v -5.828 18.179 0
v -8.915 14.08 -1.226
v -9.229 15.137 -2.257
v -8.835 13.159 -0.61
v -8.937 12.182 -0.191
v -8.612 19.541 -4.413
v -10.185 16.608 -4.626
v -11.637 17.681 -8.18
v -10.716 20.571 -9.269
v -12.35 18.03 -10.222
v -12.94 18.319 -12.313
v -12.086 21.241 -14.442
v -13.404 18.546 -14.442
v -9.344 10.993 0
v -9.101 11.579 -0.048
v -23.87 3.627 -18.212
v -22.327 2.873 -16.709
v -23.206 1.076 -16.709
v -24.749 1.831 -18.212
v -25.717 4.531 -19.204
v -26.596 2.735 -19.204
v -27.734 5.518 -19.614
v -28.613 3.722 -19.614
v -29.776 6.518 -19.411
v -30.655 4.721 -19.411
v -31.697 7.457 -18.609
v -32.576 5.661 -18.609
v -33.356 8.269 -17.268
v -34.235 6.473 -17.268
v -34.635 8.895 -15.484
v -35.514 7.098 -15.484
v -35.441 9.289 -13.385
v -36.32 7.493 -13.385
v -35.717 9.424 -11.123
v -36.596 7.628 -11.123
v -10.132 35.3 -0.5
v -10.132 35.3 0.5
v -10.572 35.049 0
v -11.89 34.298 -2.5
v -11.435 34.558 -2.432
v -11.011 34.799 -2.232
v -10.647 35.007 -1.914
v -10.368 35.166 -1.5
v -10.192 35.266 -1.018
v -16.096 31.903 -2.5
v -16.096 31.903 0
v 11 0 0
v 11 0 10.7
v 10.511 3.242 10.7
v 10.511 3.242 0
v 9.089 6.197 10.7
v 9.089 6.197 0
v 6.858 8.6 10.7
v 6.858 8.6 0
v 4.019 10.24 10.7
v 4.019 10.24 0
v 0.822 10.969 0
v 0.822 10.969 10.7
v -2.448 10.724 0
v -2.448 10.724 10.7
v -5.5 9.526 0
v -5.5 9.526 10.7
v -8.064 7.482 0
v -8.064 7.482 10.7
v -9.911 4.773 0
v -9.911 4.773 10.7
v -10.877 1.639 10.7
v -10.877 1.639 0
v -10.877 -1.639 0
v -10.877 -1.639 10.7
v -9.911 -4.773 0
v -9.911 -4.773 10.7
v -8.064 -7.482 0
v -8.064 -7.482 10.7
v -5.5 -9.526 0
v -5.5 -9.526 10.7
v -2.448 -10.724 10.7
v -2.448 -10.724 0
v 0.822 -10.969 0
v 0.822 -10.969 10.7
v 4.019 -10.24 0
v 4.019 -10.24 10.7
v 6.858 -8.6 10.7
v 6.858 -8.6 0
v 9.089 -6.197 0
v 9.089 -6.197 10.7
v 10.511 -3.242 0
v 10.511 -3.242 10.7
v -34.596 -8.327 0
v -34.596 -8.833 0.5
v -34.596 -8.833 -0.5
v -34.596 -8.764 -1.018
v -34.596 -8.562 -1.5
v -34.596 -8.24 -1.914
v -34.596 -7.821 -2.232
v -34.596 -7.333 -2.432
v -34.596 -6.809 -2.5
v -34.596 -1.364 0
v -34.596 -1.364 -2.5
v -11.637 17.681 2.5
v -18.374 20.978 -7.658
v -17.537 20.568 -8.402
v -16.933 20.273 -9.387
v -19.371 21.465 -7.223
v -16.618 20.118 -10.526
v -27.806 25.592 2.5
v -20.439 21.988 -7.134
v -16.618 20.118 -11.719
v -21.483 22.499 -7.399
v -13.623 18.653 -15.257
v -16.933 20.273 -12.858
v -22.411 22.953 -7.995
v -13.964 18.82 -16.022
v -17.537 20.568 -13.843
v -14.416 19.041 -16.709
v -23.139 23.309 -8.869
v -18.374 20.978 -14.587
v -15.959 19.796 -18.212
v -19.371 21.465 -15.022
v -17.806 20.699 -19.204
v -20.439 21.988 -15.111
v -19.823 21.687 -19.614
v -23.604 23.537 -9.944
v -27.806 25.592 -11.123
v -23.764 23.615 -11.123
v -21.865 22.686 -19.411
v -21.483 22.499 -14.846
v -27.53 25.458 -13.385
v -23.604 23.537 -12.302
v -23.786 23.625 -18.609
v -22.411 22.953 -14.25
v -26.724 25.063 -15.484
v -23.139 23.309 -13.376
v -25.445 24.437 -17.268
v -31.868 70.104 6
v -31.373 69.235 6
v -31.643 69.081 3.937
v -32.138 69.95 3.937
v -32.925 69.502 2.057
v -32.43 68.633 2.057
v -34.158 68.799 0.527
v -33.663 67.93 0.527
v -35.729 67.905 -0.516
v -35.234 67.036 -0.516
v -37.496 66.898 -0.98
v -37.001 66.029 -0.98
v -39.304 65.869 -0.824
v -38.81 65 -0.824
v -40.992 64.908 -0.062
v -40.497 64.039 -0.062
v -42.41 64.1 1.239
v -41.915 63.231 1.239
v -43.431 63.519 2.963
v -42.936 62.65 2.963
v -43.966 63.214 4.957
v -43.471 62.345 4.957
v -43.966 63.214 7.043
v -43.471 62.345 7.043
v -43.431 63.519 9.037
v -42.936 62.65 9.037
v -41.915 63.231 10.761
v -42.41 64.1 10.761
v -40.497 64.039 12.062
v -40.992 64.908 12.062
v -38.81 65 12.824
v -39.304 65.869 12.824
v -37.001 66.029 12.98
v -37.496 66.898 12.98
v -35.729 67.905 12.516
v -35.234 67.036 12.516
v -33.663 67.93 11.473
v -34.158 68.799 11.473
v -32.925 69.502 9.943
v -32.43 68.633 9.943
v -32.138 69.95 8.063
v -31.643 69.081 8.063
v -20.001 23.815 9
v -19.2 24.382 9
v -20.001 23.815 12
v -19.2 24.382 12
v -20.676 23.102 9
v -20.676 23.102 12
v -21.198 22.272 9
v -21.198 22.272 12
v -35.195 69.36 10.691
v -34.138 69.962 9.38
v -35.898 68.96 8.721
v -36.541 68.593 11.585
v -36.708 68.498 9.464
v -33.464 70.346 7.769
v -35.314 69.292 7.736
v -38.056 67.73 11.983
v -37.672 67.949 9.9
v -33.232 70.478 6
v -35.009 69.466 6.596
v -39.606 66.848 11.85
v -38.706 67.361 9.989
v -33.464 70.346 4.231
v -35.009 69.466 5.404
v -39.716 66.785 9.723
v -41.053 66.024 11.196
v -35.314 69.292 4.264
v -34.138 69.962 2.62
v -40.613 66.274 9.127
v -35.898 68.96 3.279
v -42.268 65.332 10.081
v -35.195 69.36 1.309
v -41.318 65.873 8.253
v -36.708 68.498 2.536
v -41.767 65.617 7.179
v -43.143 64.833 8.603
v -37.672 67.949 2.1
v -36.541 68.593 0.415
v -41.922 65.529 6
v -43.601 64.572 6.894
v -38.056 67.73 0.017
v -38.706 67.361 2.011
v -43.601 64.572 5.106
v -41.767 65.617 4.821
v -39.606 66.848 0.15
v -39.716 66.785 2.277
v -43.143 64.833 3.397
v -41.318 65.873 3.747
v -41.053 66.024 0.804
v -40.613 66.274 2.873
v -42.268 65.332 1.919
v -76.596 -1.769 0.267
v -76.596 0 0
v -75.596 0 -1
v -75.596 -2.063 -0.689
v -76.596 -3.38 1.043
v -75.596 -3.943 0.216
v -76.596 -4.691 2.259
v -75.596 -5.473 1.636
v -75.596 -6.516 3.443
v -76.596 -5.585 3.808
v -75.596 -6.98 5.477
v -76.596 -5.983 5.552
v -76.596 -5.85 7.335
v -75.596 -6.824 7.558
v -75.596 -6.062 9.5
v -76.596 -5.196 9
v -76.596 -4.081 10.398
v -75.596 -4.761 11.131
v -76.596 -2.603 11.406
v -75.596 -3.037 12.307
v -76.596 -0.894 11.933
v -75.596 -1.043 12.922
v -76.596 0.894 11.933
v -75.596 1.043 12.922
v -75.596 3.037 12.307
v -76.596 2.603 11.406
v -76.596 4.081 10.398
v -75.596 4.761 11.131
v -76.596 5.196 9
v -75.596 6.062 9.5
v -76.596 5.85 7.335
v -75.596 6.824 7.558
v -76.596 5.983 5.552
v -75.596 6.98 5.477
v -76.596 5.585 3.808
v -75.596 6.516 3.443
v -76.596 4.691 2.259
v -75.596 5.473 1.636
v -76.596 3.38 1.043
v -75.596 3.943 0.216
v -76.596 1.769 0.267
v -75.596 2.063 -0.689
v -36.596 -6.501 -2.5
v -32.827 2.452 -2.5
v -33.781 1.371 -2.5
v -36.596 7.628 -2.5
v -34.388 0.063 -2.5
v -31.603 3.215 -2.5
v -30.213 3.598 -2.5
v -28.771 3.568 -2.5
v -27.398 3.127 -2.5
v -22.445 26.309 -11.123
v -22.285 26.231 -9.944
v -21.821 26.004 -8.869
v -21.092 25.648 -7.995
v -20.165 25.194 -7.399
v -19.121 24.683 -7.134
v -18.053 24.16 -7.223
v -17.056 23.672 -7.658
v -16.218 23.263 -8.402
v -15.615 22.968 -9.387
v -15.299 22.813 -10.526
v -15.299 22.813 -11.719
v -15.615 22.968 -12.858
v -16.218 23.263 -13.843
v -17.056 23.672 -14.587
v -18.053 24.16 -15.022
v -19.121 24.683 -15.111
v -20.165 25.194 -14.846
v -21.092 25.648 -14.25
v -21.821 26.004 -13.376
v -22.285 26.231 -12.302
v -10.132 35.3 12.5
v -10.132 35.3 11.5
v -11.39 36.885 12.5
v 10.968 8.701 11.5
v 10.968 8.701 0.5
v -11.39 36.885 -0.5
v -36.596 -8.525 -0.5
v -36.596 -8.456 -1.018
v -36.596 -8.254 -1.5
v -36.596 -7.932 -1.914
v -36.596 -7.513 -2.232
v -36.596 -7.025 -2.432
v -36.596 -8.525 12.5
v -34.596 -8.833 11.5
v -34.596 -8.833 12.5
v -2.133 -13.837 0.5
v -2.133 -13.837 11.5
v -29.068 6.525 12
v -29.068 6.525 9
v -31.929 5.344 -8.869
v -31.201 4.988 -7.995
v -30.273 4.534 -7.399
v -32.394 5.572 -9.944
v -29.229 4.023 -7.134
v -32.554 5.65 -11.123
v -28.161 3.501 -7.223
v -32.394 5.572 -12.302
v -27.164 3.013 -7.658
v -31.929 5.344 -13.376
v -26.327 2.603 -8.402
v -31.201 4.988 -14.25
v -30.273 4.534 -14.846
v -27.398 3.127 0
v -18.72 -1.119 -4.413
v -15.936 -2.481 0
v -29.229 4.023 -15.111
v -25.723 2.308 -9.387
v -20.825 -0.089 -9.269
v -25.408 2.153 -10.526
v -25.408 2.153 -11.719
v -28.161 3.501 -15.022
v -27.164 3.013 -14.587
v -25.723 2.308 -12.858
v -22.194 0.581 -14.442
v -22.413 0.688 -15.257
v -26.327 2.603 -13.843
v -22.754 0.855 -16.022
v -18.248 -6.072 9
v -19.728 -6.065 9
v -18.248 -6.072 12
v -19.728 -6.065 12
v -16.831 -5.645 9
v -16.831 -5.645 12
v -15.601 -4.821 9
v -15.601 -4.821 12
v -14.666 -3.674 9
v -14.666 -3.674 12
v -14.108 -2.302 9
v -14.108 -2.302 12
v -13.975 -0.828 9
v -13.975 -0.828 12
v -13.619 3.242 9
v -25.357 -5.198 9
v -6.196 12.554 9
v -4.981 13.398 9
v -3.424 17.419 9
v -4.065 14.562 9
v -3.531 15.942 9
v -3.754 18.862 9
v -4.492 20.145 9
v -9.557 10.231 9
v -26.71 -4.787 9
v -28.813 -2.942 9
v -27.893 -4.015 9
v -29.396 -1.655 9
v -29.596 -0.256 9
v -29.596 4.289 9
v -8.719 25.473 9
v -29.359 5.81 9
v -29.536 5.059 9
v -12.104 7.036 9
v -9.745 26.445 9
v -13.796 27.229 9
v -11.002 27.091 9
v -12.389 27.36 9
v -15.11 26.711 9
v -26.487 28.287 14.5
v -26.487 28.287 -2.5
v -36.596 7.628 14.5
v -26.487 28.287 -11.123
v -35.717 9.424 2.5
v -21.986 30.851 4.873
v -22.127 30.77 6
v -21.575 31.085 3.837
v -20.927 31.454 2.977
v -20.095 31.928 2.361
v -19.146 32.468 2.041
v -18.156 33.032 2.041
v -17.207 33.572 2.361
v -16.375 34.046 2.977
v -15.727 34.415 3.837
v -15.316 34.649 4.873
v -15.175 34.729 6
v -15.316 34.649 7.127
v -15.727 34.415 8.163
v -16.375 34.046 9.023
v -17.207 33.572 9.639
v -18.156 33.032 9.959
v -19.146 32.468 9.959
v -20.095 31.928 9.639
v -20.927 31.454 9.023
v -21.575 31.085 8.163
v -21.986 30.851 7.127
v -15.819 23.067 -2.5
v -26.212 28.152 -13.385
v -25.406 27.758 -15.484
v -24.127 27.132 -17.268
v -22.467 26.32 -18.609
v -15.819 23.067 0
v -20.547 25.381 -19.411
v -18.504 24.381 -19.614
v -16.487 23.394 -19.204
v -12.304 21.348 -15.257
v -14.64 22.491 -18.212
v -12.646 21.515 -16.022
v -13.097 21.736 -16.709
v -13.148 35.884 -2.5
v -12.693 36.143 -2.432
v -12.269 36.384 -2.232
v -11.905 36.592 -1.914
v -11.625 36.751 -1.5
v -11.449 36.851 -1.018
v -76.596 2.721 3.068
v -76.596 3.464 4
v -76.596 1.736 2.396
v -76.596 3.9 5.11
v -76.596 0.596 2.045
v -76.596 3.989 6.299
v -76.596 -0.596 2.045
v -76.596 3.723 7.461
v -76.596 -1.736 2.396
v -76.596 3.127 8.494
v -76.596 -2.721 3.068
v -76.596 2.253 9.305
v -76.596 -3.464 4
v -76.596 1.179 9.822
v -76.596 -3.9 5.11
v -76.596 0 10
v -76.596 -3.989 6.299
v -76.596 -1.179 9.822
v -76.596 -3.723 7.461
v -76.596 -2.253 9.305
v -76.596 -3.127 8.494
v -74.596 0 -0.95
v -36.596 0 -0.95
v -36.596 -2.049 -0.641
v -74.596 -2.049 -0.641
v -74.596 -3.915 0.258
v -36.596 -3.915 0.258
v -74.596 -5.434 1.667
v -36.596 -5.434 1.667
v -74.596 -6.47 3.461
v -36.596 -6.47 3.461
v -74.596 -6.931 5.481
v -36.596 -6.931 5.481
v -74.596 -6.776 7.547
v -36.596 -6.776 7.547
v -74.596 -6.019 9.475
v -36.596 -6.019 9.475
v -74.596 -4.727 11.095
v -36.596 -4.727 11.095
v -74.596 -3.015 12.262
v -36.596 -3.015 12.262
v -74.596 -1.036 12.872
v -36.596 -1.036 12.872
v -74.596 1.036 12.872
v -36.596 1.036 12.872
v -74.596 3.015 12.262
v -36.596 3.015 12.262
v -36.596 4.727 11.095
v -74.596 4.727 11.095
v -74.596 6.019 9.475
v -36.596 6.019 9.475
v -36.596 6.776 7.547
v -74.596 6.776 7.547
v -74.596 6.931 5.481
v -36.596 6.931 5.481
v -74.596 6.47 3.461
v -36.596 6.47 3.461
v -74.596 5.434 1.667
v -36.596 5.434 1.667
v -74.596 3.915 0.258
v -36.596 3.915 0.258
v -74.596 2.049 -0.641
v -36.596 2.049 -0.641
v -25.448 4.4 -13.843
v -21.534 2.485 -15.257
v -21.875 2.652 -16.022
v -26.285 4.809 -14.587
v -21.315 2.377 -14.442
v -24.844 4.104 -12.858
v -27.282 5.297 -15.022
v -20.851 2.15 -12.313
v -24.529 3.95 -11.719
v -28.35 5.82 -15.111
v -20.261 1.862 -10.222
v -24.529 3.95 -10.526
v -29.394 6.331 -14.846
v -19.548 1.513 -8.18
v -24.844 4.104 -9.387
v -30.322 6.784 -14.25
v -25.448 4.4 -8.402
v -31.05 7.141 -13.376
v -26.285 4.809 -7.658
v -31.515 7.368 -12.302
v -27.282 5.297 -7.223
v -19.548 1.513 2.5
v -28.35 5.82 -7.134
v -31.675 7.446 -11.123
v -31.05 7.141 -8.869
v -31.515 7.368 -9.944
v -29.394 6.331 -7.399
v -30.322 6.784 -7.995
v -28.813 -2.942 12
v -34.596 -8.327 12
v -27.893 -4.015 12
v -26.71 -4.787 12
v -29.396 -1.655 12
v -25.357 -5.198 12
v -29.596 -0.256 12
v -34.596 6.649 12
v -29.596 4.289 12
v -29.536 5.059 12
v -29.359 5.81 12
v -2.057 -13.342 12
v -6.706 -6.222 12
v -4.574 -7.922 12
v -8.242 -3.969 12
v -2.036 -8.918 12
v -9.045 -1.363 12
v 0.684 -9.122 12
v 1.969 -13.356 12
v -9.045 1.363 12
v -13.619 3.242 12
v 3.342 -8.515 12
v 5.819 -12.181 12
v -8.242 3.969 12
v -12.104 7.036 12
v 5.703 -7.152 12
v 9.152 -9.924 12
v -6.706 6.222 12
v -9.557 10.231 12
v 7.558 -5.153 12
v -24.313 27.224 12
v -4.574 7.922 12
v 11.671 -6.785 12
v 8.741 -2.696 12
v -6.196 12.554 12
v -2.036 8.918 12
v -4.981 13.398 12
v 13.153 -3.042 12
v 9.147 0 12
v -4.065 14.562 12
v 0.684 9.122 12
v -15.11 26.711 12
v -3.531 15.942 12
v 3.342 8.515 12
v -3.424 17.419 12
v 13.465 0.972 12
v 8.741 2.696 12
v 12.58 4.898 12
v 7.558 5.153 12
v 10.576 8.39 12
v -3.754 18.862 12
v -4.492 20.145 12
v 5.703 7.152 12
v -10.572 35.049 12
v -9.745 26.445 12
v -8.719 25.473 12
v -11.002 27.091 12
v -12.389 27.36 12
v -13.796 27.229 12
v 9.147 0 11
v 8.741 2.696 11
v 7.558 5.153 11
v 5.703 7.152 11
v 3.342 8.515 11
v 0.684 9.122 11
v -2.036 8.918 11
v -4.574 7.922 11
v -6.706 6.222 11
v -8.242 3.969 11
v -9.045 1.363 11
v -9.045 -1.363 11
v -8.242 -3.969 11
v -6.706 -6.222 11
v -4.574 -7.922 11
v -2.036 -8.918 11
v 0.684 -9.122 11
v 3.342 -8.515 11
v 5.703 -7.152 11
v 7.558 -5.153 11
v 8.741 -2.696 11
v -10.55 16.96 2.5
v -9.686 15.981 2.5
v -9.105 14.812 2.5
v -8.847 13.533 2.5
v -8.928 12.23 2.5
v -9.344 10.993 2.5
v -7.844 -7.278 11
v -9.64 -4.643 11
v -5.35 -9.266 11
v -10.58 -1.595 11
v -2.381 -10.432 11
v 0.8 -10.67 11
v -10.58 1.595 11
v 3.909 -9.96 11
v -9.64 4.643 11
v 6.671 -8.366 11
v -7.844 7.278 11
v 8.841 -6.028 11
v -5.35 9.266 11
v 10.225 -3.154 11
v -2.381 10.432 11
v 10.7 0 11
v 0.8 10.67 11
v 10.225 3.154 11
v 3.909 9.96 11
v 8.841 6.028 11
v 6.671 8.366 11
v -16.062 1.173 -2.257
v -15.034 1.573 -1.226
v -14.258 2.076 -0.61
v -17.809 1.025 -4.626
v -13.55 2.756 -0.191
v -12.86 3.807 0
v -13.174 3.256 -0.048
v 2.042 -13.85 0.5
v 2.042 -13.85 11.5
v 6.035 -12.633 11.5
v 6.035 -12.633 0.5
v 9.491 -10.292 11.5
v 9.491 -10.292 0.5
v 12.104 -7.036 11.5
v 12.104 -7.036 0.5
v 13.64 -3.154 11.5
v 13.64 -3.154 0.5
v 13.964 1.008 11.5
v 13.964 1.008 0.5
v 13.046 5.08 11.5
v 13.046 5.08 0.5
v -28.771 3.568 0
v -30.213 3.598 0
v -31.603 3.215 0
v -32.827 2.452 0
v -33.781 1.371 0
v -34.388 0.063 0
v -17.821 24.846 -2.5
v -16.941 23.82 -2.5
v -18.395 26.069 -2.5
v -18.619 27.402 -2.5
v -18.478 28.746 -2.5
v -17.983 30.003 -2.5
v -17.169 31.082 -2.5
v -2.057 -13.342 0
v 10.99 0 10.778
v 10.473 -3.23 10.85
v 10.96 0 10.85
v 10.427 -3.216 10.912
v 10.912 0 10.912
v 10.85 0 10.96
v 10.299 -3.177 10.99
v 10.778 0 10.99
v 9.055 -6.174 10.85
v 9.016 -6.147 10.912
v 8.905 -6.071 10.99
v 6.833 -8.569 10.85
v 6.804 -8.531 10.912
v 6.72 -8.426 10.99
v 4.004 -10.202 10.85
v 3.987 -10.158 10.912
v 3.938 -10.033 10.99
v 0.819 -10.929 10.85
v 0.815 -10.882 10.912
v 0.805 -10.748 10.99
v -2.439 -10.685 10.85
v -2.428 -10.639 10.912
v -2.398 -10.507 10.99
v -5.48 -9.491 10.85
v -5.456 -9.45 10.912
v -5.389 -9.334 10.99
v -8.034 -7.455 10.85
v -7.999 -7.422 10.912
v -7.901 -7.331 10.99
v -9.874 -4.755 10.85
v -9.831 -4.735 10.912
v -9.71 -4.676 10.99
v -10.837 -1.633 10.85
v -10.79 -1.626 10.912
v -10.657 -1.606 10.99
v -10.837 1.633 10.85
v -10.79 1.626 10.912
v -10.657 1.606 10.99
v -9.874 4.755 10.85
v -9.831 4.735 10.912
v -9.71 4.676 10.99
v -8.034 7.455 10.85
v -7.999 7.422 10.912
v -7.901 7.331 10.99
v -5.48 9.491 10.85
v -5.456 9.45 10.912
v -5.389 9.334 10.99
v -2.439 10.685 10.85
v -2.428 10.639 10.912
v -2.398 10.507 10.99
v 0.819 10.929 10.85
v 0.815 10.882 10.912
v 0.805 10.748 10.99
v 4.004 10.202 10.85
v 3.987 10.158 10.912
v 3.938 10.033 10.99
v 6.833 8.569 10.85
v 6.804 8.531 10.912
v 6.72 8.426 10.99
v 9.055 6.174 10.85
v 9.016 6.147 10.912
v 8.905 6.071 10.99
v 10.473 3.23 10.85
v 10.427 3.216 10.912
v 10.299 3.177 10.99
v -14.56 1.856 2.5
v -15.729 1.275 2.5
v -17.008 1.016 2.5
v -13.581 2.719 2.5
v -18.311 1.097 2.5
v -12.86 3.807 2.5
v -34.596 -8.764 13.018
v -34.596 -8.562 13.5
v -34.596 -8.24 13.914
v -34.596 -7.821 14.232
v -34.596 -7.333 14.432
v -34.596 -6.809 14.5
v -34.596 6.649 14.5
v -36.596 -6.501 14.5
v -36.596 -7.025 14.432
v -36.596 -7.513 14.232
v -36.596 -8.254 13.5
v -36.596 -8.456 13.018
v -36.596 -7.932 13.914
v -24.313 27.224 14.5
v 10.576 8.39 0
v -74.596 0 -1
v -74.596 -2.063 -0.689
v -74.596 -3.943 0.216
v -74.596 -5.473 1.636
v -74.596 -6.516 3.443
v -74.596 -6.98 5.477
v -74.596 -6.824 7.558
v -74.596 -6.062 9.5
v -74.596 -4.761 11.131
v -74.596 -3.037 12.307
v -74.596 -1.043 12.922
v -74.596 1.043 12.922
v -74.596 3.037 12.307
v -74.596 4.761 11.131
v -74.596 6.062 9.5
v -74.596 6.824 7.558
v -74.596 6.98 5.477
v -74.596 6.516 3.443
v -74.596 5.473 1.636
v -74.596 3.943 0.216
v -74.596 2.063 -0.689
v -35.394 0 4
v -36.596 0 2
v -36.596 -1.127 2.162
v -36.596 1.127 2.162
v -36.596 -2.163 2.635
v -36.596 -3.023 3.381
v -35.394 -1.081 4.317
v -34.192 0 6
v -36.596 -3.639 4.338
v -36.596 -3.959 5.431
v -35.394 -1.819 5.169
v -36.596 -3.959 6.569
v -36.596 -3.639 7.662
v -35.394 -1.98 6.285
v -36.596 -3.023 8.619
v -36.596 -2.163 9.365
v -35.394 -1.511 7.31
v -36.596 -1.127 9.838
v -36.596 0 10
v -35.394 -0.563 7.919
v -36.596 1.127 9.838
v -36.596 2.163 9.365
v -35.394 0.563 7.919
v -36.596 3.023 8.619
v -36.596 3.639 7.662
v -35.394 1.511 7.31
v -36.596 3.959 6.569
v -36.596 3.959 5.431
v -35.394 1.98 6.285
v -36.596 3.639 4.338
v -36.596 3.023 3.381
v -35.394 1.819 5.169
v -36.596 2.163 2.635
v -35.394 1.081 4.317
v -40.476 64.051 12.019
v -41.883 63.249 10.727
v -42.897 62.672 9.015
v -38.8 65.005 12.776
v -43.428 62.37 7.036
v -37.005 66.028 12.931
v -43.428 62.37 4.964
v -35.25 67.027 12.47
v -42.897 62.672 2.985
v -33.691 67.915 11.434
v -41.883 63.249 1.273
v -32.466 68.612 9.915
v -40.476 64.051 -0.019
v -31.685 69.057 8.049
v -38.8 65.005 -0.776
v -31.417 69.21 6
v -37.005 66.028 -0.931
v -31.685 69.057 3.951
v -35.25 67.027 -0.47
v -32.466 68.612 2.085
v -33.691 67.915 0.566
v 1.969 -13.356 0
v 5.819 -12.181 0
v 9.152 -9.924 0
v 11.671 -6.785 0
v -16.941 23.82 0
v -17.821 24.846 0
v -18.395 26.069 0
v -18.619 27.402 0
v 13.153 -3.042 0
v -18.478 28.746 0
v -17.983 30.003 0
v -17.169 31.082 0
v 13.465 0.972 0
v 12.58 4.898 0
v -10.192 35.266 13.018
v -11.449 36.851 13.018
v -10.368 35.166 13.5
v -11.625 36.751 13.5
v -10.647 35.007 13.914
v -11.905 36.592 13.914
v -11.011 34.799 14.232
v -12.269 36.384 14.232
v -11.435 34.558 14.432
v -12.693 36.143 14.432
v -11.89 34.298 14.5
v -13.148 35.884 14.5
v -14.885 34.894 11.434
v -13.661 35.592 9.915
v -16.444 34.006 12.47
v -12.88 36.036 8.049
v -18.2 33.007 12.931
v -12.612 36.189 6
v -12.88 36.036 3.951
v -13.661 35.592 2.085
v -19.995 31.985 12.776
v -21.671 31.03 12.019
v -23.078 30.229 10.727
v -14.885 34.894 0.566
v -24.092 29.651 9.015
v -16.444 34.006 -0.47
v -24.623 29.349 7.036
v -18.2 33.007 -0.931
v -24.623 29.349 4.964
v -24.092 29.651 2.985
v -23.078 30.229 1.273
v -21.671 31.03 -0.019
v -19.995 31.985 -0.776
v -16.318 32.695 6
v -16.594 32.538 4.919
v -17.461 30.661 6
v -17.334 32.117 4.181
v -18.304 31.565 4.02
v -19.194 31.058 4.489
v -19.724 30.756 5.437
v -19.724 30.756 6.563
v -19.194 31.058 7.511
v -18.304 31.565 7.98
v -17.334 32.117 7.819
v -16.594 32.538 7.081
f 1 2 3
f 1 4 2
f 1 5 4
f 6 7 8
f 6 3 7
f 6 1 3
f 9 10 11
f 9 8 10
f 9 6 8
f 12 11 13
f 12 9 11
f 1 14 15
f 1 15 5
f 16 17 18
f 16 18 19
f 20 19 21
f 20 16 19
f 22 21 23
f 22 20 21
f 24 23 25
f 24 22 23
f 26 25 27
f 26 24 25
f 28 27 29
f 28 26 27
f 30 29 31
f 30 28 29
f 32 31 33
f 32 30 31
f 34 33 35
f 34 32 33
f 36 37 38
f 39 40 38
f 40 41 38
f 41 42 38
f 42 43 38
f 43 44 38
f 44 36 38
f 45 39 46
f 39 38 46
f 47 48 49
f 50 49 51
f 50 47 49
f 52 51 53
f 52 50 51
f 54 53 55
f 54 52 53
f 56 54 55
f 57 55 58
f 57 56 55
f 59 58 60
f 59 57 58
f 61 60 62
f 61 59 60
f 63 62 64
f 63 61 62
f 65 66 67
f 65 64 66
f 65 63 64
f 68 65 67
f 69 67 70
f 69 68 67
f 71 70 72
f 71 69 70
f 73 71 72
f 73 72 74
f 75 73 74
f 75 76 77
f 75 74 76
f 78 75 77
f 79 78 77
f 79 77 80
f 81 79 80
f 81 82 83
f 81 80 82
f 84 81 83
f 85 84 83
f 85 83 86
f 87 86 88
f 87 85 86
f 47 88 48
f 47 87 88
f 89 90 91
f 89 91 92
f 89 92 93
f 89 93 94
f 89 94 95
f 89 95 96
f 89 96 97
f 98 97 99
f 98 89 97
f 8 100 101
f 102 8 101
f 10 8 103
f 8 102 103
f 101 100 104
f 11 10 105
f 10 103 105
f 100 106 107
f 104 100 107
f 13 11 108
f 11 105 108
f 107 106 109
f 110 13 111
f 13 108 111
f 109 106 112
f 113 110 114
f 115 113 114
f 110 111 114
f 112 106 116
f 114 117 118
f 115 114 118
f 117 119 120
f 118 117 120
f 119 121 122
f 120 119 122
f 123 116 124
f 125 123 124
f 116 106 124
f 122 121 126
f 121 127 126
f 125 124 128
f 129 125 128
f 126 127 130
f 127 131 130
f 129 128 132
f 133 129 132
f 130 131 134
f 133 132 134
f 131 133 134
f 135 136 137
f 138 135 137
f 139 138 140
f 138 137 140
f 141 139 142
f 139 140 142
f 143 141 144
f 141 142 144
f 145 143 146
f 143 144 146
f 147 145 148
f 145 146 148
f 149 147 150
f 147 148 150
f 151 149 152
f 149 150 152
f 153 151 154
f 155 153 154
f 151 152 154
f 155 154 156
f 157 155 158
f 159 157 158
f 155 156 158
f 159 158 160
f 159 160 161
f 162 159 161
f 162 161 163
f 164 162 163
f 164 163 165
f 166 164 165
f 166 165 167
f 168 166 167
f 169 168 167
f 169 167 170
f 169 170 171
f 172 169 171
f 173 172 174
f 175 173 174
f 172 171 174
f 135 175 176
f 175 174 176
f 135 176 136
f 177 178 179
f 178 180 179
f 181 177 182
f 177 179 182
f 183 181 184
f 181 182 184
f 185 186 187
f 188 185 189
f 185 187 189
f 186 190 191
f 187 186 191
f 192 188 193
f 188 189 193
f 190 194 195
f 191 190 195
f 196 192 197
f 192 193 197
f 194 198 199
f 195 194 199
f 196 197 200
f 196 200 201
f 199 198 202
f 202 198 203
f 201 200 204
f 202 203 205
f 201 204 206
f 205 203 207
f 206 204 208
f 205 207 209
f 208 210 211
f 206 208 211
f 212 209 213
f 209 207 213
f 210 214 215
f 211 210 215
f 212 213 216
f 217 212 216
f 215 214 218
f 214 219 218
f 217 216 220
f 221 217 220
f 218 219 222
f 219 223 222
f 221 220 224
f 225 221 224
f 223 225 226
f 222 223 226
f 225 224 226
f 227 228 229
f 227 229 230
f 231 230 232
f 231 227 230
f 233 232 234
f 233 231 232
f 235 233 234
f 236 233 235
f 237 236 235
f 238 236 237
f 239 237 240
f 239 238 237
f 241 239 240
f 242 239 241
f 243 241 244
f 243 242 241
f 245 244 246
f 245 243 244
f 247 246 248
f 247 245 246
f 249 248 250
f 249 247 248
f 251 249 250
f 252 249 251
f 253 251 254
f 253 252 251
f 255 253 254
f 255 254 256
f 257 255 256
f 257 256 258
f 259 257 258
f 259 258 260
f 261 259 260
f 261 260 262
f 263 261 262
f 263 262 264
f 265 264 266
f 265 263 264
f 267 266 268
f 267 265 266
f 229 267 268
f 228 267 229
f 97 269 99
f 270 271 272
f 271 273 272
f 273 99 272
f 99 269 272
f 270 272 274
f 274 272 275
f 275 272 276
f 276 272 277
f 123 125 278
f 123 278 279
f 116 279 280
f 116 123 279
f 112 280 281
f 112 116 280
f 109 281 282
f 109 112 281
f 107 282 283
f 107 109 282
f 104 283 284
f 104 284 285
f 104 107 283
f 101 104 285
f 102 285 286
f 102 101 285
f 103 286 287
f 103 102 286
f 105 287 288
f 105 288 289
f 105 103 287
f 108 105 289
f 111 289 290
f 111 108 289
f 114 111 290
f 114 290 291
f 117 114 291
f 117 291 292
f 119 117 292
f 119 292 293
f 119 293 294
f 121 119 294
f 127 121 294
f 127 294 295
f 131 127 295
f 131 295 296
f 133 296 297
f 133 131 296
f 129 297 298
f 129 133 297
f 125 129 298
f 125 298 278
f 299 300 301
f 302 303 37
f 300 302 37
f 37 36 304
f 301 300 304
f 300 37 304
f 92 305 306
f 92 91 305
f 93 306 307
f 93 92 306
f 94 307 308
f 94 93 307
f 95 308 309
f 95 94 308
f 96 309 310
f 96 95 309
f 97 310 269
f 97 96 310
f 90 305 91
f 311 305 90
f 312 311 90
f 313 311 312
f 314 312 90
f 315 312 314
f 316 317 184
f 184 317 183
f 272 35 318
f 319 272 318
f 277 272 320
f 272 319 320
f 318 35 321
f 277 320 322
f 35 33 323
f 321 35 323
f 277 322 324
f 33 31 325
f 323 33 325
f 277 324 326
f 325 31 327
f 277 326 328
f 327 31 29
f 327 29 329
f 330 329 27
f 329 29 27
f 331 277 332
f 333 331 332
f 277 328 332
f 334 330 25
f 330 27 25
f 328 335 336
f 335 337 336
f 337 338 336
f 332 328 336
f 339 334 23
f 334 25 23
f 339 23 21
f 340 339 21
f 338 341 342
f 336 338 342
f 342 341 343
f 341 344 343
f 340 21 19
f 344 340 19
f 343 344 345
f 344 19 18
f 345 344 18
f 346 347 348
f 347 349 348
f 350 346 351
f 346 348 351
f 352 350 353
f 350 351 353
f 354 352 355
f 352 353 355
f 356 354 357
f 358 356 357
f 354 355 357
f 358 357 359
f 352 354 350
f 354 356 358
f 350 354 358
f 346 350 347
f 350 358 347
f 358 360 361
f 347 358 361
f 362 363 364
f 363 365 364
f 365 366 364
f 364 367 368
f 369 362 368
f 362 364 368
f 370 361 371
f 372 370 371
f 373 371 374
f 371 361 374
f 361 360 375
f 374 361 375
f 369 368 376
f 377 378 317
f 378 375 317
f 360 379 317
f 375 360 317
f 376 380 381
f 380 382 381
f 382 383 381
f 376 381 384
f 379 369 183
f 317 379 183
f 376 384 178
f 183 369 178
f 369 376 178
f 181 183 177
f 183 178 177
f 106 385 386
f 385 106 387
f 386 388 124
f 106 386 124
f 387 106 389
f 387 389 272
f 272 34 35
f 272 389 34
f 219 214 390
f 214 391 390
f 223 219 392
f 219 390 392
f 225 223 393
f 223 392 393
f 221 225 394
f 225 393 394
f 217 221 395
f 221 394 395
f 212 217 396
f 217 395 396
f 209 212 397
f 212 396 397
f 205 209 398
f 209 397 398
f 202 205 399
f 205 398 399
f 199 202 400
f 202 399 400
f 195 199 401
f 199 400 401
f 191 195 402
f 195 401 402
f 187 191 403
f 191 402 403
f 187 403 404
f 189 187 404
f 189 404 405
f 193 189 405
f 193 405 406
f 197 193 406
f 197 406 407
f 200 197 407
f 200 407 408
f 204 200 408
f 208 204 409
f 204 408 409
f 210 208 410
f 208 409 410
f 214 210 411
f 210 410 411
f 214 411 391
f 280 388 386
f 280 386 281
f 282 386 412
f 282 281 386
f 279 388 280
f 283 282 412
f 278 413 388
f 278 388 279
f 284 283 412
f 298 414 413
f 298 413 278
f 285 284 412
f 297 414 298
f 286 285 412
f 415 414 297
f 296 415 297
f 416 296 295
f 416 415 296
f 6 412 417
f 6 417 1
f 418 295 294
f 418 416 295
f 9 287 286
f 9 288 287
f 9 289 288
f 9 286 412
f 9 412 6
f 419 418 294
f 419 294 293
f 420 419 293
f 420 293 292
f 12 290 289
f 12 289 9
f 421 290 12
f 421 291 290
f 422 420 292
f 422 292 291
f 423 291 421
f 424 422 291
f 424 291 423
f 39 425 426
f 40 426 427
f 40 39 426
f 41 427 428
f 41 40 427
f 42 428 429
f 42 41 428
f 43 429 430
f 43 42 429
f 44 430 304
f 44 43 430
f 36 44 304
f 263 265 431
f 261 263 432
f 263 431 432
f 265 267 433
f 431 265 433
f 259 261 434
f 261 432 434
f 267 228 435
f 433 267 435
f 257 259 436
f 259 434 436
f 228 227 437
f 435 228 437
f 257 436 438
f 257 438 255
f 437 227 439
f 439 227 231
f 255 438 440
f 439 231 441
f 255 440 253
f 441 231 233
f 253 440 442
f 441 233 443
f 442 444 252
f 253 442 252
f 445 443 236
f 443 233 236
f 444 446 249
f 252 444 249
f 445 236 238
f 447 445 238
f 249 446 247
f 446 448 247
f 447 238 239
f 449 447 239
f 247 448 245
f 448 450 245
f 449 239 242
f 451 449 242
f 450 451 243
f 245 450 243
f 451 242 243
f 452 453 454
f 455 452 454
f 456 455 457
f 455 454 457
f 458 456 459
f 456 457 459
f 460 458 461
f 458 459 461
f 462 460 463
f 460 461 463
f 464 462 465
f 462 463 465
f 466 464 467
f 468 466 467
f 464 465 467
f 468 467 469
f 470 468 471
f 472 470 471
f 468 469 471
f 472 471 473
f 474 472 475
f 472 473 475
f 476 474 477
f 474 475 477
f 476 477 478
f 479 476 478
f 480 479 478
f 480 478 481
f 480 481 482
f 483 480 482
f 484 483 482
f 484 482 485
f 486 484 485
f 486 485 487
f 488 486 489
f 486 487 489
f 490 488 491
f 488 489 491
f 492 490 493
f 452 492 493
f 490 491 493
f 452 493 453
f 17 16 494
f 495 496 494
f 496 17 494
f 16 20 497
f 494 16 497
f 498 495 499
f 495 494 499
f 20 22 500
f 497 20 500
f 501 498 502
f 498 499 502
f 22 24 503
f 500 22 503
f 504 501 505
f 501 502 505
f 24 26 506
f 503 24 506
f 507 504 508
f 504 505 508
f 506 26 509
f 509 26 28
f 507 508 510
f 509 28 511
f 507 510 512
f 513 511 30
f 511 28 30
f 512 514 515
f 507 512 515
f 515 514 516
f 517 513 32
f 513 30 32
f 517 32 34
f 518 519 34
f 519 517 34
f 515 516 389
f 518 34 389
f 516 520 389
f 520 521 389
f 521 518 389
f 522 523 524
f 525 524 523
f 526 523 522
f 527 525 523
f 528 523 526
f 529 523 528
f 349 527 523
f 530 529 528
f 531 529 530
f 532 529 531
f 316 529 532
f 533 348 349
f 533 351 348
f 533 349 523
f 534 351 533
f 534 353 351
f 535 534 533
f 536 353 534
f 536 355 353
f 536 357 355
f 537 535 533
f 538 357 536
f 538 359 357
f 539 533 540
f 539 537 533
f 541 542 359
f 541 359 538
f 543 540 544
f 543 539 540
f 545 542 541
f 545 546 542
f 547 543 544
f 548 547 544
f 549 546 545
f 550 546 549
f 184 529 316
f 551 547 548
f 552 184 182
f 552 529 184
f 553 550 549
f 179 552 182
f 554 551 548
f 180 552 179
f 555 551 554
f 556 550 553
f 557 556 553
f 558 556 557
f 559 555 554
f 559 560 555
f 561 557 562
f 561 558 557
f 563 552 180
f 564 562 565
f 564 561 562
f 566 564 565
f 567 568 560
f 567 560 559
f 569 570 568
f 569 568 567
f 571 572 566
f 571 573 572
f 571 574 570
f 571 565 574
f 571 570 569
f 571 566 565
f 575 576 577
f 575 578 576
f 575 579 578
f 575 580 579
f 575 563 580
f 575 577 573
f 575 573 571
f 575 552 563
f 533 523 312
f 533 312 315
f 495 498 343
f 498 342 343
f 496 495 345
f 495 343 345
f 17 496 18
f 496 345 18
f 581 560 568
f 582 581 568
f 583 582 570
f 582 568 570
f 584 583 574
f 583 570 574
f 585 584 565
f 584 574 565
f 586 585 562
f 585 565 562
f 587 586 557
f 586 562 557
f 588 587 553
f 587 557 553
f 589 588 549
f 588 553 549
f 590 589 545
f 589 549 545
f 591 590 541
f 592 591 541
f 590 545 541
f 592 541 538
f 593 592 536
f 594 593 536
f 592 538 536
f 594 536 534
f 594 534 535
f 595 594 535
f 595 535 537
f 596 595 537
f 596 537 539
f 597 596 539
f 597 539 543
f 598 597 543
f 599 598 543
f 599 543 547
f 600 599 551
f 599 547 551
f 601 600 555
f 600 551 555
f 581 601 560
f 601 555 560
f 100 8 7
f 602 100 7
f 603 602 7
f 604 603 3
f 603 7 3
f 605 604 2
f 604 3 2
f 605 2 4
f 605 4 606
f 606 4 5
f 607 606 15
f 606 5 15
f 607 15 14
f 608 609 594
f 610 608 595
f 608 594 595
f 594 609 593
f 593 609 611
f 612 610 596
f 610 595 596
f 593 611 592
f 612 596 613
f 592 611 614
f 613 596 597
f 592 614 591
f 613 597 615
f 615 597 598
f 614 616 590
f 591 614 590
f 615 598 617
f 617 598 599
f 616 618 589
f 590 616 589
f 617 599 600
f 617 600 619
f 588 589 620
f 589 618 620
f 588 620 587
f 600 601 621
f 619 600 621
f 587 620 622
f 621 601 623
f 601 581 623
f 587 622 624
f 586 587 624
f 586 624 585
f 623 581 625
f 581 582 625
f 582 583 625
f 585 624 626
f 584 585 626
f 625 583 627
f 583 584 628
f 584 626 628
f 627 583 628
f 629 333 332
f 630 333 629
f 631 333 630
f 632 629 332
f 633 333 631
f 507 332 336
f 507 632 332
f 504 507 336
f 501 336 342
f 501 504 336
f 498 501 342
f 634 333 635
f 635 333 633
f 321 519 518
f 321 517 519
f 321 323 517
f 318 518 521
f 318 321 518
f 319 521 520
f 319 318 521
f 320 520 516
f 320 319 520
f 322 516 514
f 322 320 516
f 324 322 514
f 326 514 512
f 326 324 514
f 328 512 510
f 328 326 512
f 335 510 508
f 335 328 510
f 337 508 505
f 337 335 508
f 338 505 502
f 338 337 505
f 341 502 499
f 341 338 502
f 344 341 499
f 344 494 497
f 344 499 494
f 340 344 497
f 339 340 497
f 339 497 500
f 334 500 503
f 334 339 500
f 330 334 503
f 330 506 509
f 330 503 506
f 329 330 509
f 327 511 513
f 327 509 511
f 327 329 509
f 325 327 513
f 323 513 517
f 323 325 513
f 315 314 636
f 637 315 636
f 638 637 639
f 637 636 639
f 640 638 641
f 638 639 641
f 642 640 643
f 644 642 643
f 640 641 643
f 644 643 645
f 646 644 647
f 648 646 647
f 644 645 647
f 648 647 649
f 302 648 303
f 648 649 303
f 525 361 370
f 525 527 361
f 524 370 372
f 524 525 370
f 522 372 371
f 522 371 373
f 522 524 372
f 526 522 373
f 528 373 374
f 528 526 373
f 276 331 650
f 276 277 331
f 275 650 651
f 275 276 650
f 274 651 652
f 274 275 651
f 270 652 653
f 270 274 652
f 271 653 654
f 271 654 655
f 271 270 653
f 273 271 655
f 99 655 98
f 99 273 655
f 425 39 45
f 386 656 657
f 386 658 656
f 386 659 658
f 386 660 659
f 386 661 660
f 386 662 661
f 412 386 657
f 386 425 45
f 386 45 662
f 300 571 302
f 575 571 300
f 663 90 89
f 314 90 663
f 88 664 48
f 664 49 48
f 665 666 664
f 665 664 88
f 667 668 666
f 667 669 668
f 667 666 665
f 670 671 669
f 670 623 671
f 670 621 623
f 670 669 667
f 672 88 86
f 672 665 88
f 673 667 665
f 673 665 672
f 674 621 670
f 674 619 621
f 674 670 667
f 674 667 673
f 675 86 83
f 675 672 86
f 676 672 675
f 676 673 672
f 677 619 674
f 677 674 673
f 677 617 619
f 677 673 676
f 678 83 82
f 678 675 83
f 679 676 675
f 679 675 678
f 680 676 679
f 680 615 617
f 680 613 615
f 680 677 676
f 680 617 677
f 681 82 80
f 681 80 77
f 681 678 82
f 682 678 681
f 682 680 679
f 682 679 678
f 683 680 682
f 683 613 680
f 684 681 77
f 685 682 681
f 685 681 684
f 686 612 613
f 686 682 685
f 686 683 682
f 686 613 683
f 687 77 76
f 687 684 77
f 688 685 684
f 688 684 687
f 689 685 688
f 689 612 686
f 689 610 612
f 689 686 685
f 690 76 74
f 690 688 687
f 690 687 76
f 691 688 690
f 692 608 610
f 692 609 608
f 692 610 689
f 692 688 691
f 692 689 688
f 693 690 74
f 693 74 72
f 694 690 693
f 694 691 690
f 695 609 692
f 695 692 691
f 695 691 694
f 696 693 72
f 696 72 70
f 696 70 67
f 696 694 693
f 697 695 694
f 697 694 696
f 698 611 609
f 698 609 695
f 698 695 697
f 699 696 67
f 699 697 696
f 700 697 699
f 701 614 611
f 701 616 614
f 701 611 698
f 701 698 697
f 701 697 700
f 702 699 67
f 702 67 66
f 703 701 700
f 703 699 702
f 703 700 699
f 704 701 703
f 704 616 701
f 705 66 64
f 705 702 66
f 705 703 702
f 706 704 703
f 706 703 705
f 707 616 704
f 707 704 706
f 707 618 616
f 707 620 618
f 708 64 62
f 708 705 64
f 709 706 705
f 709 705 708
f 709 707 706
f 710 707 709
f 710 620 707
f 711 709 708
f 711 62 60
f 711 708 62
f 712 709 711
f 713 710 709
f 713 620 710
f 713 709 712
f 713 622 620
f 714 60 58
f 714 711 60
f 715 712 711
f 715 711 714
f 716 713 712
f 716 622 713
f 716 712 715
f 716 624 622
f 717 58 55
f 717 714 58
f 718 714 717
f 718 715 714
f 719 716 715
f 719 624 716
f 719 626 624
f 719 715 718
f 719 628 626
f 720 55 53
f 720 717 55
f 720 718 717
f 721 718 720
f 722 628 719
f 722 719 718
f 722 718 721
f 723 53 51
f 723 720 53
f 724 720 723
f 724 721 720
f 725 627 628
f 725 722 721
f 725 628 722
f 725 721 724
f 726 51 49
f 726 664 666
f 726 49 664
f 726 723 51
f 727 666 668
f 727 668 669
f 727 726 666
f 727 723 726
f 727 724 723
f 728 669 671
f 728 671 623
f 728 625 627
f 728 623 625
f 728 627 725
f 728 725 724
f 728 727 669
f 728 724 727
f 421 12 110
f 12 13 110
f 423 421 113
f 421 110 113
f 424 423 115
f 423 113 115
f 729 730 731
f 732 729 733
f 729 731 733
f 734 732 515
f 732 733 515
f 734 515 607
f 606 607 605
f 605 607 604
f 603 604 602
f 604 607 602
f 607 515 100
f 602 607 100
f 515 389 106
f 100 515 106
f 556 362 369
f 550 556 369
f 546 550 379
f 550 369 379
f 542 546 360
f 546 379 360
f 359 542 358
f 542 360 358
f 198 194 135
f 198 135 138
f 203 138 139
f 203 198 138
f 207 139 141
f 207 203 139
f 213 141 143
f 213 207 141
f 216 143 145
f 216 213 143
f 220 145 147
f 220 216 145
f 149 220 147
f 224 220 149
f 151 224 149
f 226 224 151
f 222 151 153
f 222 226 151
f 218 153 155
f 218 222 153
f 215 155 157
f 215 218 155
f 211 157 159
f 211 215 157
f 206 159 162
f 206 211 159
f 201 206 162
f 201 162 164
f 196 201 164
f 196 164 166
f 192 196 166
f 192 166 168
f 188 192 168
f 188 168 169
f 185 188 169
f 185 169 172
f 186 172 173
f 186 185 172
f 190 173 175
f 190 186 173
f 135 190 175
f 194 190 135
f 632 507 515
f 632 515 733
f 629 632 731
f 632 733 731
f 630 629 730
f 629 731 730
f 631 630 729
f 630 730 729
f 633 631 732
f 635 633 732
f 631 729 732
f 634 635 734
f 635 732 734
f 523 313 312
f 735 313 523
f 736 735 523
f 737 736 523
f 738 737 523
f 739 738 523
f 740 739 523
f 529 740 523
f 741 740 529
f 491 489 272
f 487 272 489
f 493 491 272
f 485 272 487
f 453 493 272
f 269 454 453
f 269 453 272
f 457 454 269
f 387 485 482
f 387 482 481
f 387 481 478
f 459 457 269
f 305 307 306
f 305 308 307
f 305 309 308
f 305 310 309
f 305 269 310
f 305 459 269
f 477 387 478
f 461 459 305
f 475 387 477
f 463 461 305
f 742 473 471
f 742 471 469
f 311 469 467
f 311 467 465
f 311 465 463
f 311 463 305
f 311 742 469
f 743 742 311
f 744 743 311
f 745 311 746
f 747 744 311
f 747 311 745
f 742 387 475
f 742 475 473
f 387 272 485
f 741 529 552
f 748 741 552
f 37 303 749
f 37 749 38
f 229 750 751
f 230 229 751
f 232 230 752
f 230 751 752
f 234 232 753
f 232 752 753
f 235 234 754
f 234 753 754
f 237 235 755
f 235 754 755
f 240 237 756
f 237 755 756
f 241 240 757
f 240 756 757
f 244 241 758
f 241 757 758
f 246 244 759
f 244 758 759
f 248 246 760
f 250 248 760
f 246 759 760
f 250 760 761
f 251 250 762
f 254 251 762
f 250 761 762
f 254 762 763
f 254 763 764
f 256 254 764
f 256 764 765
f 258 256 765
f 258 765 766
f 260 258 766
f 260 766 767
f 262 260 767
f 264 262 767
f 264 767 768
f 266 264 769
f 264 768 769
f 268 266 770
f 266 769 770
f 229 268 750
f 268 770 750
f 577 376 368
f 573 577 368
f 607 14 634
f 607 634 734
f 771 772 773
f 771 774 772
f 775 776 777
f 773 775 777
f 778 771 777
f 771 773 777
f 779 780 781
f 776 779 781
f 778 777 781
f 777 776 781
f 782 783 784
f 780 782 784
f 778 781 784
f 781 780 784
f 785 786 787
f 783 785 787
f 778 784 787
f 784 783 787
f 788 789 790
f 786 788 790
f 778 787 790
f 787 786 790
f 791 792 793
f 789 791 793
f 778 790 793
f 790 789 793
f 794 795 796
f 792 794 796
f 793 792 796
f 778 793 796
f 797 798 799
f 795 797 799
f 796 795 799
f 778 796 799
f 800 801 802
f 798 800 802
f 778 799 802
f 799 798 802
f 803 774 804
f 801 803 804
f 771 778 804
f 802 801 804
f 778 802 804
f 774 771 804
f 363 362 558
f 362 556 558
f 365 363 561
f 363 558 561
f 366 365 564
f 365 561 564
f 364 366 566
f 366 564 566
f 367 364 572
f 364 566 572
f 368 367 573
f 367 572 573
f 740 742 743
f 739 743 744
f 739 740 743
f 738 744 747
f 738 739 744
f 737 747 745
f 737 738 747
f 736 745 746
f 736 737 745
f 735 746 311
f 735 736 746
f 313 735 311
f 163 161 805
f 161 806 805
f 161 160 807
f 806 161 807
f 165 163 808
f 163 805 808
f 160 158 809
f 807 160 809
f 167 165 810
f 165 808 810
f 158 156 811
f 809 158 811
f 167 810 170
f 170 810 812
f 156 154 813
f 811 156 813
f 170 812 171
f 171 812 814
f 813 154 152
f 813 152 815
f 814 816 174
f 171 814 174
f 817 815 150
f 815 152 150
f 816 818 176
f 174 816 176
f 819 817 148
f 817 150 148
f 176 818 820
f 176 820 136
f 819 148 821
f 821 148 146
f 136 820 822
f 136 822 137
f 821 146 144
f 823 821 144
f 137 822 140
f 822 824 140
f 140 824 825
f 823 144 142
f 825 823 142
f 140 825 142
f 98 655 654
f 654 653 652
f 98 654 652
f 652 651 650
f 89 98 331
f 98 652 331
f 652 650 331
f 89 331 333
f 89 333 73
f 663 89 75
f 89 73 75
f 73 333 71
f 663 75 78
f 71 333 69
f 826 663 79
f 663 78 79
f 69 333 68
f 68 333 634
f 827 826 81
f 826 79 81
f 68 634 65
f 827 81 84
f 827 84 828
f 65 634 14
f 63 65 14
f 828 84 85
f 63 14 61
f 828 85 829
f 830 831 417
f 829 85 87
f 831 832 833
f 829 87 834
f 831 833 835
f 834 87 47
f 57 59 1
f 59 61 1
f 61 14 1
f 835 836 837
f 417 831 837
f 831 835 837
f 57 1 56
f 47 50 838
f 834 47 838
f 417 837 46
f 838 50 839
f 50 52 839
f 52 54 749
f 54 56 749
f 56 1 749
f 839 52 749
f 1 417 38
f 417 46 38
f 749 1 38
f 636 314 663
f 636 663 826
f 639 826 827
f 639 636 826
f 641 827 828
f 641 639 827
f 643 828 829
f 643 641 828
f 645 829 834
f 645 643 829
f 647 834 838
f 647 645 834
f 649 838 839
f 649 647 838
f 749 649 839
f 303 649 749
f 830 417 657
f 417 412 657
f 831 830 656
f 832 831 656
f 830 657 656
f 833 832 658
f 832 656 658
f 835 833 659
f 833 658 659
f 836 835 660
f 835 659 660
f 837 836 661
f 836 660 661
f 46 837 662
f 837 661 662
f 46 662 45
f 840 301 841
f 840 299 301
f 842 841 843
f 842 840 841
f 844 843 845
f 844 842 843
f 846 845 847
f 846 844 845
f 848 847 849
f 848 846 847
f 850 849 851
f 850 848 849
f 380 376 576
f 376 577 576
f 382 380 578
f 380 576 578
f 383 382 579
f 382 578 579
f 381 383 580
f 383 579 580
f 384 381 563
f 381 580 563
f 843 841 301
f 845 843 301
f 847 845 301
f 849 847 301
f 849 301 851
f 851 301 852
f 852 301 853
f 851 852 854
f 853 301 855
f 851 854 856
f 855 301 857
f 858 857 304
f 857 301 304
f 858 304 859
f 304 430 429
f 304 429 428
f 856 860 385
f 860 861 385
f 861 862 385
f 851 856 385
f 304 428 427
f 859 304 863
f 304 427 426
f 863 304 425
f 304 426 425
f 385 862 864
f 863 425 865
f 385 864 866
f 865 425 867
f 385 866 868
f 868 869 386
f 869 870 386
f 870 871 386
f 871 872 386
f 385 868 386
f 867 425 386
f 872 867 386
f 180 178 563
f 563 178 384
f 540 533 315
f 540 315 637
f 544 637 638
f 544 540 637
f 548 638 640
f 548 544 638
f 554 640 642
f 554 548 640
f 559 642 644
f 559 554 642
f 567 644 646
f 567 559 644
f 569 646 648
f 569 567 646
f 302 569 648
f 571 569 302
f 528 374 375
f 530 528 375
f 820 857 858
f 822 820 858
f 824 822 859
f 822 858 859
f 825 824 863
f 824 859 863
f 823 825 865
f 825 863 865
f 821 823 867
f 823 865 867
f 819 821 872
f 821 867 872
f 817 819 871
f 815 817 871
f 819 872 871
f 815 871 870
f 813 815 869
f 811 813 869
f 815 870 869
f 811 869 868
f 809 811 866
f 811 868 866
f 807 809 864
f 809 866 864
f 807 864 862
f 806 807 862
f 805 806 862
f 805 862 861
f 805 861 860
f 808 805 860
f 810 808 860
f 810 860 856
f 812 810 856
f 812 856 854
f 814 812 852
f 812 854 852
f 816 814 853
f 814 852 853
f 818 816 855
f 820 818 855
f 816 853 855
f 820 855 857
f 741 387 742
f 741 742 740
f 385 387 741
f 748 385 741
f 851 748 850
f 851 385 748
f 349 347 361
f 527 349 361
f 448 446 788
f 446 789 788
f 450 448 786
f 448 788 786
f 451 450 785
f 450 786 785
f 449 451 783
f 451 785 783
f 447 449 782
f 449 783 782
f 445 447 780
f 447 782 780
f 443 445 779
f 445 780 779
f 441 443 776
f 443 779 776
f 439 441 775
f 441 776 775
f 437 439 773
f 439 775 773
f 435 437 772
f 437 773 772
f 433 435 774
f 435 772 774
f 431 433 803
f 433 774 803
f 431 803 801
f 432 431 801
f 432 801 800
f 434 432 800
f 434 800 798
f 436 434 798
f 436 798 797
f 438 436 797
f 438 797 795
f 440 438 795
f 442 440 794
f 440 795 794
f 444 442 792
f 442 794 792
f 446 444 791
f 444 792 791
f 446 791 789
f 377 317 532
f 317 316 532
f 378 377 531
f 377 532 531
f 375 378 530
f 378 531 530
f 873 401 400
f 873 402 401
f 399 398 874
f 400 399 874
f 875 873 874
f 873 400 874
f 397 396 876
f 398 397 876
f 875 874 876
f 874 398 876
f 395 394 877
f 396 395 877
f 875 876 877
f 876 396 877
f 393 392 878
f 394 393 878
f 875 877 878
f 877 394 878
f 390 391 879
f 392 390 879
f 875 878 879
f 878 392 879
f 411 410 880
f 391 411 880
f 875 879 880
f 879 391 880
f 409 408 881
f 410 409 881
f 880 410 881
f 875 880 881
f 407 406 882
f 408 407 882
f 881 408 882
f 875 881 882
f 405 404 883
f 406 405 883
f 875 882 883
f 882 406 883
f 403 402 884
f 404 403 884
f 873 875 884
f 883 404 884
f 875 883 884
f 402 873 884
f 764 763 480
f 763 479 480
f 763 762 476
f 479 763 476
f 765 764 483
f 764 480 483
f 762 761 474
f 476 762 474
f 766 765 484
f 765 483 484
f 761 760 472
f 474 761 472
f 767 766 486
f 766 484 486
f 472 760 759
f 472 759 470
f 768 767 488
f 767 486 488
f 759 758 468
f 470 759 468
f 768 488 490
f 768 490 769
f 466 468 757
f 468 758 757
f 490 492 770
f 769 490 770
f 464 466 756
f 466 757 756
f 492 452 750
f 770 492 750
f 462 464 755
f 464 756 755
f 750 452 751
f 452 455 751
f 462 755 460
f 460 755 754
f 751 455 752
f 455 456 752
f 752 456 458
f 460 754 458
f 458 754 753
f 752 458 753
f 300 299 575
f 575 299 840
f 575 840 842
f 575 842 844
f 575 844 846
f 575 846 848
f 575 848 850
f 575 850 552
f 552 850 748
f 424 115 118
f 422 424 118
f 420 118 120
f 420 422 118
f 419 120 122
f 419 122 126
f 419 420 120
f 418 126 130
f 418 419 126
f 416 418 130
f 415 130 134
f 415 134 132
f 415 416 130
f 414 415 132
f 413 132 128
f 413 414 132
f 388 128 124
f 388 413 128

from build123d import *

# Parameters (mm, degrees)
SZKIC1_R                         = 11
DODANIE_WYCI_GNI_CIE1_DEPTH      = 12
SZKIC4_R                         = 11.147474951019817
SZKIC4_R_2                       = 9.147474951019817
DODANIE_WYCI_GNI_CIE2_DEPTH      = 1
SZKIC13_R                        = 4.000000000000003
DODANIE_WYCI_GNI_CIE3_DEPTH      = 11.5
WYTNIJ_WYCI_GNI_CIE1_DEPTH       = 60.02626138756585
WYTNIJ_WYCI_GNI_CIE2_DEPTH       = 58.227067591020045
WYTNIJ_WYCI_GNI_CIE3_DEPTH       = 23
DODANIE_WYCI_GNI_CIE4_DEPTH      = 2.5
DODANIE_WYCI_GNI_CIE4_DEPTH_BACK = 14.5
DODANIE_WYCI_GNI_CIE5_DEPTH      = 2.5
OTWORY_USTALAJ_CE_8_0MM1_D       = 8
OTWORY_USTALAJ_CE_8_0MM1_DEPTH   = 40
OTWORY_USTALAJ_CE_8_0MM1_TIP     = 2.403442476110241
OTWORY_USTALAJ_CE_8_0MM2_D       = 8
OTWORY_USTALAJ_CE_8_0MM2_DEPTH   = 40
OTWORY_USTALAJ_CE_8_0MM2_TIP     = 2.403442476110241
SFAZOWANIE1_SIZE                 = 1
ZAOKR_GLENIE2_R                  = 2
ZAOKR_GLENIE3_R                  = 5
SFAZOWANIE2_SIZE                 = 0.5
ZAOKR_GLENIE4_R                  = 0.3
ZAOKR_GLENIE5_R                  = 5
WYTNIJ_WYCI_GNI_CIE4_START       = -3
WYTNIJ_WYCI_GNI_CIE4_DEPTH       = 3
ZAOKR_GLENIE11_R                 = 5


with BuildPart() as part:
    # Szkic1 → Dodanie-wyciągnięcie1 (new body)
    with BuildSketch(Plane.XY):
        with BuildLine():
            Line((-40, -8.000000000000005), (-2.1326786841408407, -13.836606579295779))
            ThreePointArc((-2.1326786841408407, -13.836606579295779), (12.103611293588447, -7.035807960264275), (10.968141143659846, 8.700567789101818))
            Line((10.968141143659846, 8.700567789101818), (-12.843130370941623, 38.71761875780841))
            Line((-12.843130370941623, 38.71761875780841), (-26.746589095410883, 30.799674864537906))
            Line((-26.746589095410883, 30.799674864537906), (-40, 7.999999999999995))
            Line((-40, 7.999999999999995), (-40, -8.000000000000005))
        make_face()
        Circle(SZKIC1_R, mode=Mode.SUBTRACT)
    extrude(amount=DODANIE_WYCI_GNI_CIE1_DEPTH)

    # Szkic4 → Dodanie-wyciągnięcie2 (add)
    with BuildSketch(Plane.XY.offset(12)):
        Circle(SZKIC4_R)
        Circle(SZKIC4_R_2, mode=Mode.SUBTRACT)
    extrude(amount=-DODANIE_WYCI_GNI_CIE2_DEPTH)

    # Szkic13 → Dodanie-wyciągnięcie3 (add, symmetric)
    with BuildSketch(Plane(origin=(0.996619630552348, 2.0368751739166404, 3.1e-16), x_dir=(0.8982426752029381, -0.43949982530630105, 0), z_dir=(0.4394998253063011, 0.8982426752029382, 0))):
        with BuildLine():
            Line((-36.22413445269548, 11.122577076374291), (-36.22413445269548, 8.67e-15))
            Line((-36.22413445269548, 8.67e-15), (-33.72413445269548, 7.61e-15))
            Line((-33.72413445269548, 7.61e-15), (-13.224134452695484, 6.94e-15))
            ThreePointArc((-13.224134452695484, 6.94e-15), (-17.80107386619313, 7.230855656561982), (-20.374424199879662, 15.392443491106029))
            ThreePointArc((-20.374424199879662, 15.392443491106029), (-29.935182038237862, 19.329968170654332), (-36.22413445269548, 11.122577076374291))
        make_face()
        with Locations(Location((-27.724134452695484, 11.122577076374293, 0), (0, 0, 180))):
            Circle(SZKIC13_R, mode=Mode.SUBTRACT)
    extrude(amount=DODANIE_WYCI_GNI_CIE3_DEPTH, both=True)

    # Szkic15 → Wytnij-wyciągnięcie1 (cut, through all)
    with BuildSketch(Plane(origin=(0, 0, 0), x_dir=(-1, 0, 0), z_dir=(0, 0, -1))):
        Polygon((12.843130370941623, 38.71761875780841), (26.746589095410883, 30.799674864537906), (40, 7.999999999999995), (40, -8.000000000000005), (38.494484112785884, -8.232049789295985), (38.494484112785884, 7.999999999999995), (26.00155220007409, 29.491432489730776), (12.09809347560483, 37.40937638300129), (11.896450058886177, 37.52421120875695), align=None)
    extrude(amount=-WYTNIJ_WYCI_GNI_CIE1_DEPTH, mode=Mode.SUBTRACT)

    # Szkic16 → Wytnij-wyciągnięcie2 (cut, through all)
    with BuildSketch(Plane(origin=(0, 0, 0), x_dir=(-1, 0, 0), z_dir=(0, 0, -1))):
        Polygon((26.48719581612529, 28.287166702582056), (36.59569179817021, 7.627585172914479), (36.59569179817021, -8.524716482663612), (38.494484112785884, -8.232049789295985), (38.494484112785884, 7.999999999999995), (26.00155220007409, 29.491432489730776), (11.896450058886177, 37.52421120875695), (11.389545957202317, 36.88519593201458), align=None)
    extrude(amount=-WYTNIJ_WYCI_GNI_CIE2_DEPTH, mode=Mode.SUBTRACT)

    # Szkic17 → Wytnij-wyciągnięcie3 (cut)
    with BuildSketch(Plane(origin=(-32.53806343770011, 15.920500763831628, 0), x_dir=(0, 0, 1), z_dir=(-0.898242675202938, 0.4394998253063012, 0))):
        Polygon((-27.81416800588854, 10.767622358797922), (-27.814168005888536, -7.232377641202076), (1.18e-15, -7.232377641202076), (2.5, -7.232377641202076), (2.5000000000000004, 10.767622358797922), (4.3e-16, 10.767622358797922), align=None)
    extrude(amount=-WYTNIJ_WYCI_GNI_CIE3_DEPTH, mode=Mode.SUBTRACT)

    # Szkic18 → Obrót1 (revolve)
    with BuildSketch(Plane(origin=(0, 0, 6), x_dir=(-1, 0, 0), z_dir=(0, 0, -1)), mode=Mode.PRIVATE) as obr_t1_sk:
        Polygon((76.59569179817022, 0), (76.59569179817021, -7), (74.59569179817021, -7), (74.59569179817021, -6.95), (36.59569179817021, -6.949999999999999), (36.59569179817021, 0), align=None)
    revolve(obr_t1_sk.sketch.rotate(Axis((0, 0, 6), (-1, 0, 0)), 270), axis=Axis((0, 0, 6), (-1, 0, 0)))

    # Szkic19 → Obrót2 (revolve)
    with BuildSketch(Plane(origin=(0, 0, 6), x_dir=(-1, 0, 0), z_dir=(0, 0, -1))):
        Polygon((38.44574931620652, 67.5085471625366), (32.36298612425123, 70.97264761584243), (31.373243137592404, 69.23471527528378), (31.416691446106377, 69.20997170061732), (12.611574699588953, 36.18925723000281), (18.65088517799791, 32.74989261638888), align=None)
    revolve(axis=Axis((0, 0, 6), (-0.4948714933294059, 0.868966170279329, 0)))

    # Szkic20 → Dodanie-wyciągnięcie4 (add, two sides: drawn at the far end of the back side and taken through both)
    with BuildSketch(Plane(origin=(0, 0, 0), x_dir=(-1, 0, 0), z_dir=(0, 0, -1)).offset(-DODANIE_WYCI_GNI_CIE4_DEPTH_BACK)):
        Polygon((36.59569179817021, -8.524716482663612), (34.59569179817021, -8.832982627533559), (34.59569179817021, 6.649008141474715), (36.59569179817021, 7.627585172914479), align=None)
        Polygon((26.48719581612529, 28.287166702582056), (11.389545957202317, 36.88519593201458), (10.13193011920909, 35.29981571891061), (24.31339302460761, 27.223549961252633), align=None)
    extrude(amount=DODANIE_WYCI_GNI_CIE4_DEPTH + DODANIE_WYCI_GNI_CIE4_DEPTH_BACK)

    # Szkic21 → Dodanie-wyciągnięcie5 (add)
    with BuildSketch(Plane.XY.offset(12)):
        Polygon((-24.313393024607603, 27.22354996125263), (-26.48719581612529, 28.287166702582056), (-36.59569179817021, 7.627585172914479), (-34.59569179817021, 6.649008141474715), align=None)
    extrude(amount=DODANIE_WYCI_GNI_CIE5_DEPTH)

    # Otwory ustalające Ø8.0mm1
    with Locations(Plane(origin=(-76.595691798, 0, 6), x_dir=(0, 0, -1), z_dir=(-1, 0, 0))):
        with Locations((0, 0)):
            Hole(OTWORY_USTALAJ_CE_8_0MM1_D / 2, depth=OTWORY_USTALAJ_CE_8_0MM1_DEPTH)
            with Locations((0, 0, -(OTWORY_USTALAJ_CE_8_0MM1_DEPTH + OTWORY_USTALAJ_CE_8_0MM1_TIP / 2))):  # 118° drill point
                Cone(0, OTWORY_USTALAJ_CE_8_0MM1_D / 2, OTWORY_USTALAJ_CE_8_0MM1_TIP, mode=Mode.SUBTRACT)

    # Otwory ustalające Ø8.0mm2
    with Locations(Plane(origin=(-38.445749316, 67.508547163, 6), x_dir=(0.868966170279, 0.494871493329, 0), z_dir=(-0.494871493329, 0.868966170279, 0))):
        with Locations((0, 0)):
            Hole(OTWORY_USTALAJ_CE_8_0MM2_D / 2, depth=OTWORY_USTALAJ_CE_8_0MM2_DEPTH)
            with Locations((0, 0, -(OTWORY_USTALAJ_CE_8_0MM2_DEPTH + OTWORY_USTALAJ_CE_8_0MM2_TIP / 2))):  # 118° drill point
                Cone(0, OTWORY_USTALAJ_CE_8_0MM2_D / 2, OTWORY_USTALAJ_CE_8_0MM2_TIP, mode=Mode.SUBTRACT)

    # Sfazowanie1
    sfazowanie1_edges = [part.edges().sort_by_distance(p)[0] for p in [
        (-76.59569179817021, -2.41e-15, 13),
        (-44.52851250816182, 64.04444670923077, 5.999999999999999),
    ]]
    chamfer(sfazowanie1_edges, length=SFAZOWANIE1_SIZE)

    # Zaokrąglenie2
    zaokr_glenie2_edges = [part.edges().sort_by_distance(p)[0] for p in [
        (-35.59569179817021, -8.678849555098585, 14.5),
        (-35.59569179817021, -8.678849555098585, -2.5),
        (-10.760738038205703, 36.092505825462595, 14.5),
        (-10.760738038205703, 36.092505825462595, -2.5),
    ]]
    fillet(zaokr_glenie2_edges, radius=ZAOKR_GLENIE2_R)

    # Zaokrąglenie3
    zaokr_glenie3_edges = [part.edges().sort_by_distance(p)[0] for p in [
        (-7.146113762376627, 15.483942694928315, 1.249999999999997),
        (-15.057110617890048, -0.6844254587245677, 1.2499999999999964),
        (-34.59569179817021, 6.649008141474715, -1.250000000000004),
        (-24.31339302460761, 27.223549961252633, -1.2500000000000024),
    ]]
    fillet(zaokr_glenie3_edges, radius=ZAOKR_GLENIE3_R)

    # Sfazowanie2
    sfazowanie2_edges = [part.edges().sort_by_distance(p)[0] for p in [
        (-18.364185241155525, -11.334794603414672, 12),
        (-18.364185241155525, -11.334794603414672, 0),
        (12.103611293588445, -7.0358079602642745, 12),
        (0.41810551222537384, 22.000191754006217, 0),
        (12.103611293588445, -7.0358079602642745, 0),
        (0.41810551222537384, 22.000191754006217, 12),
    ]]
    chamfer(sfazowanie2_edges, length=SFAZOWANIE2_SIZE)

    # Zaokrąglenie4
    zaokr_glenie4_edges = [part.edges().sort_by_distance(p)[0] for p in [
        (-11, -6.23e-15, 11),
    ]]
    fillet(zaokr_glenie4_edges, radius=ZAOKR_GLENIE4_R)

    # Zaokrąglenie5
    zaokr_glenie5_edges = [part.edges().sort_by_distance(p)[0] for p in [
        (-12.909559415404027, 19.973857802509606, -15.392443491106027),
        (-21.9193058341832, 1.5598829608493752, -15.39244349110603),
    ]]
    fillet(zaokr_glenie5_edges, radius=ZAOKR_GLENIE5_R)

    # Szkic29 → Wytnij-wyciągnięcie4 (cut)
    with BuildSketch(Plane.XY.offset(12).offset(WYTNIJ_WYCI_GNI_CIE4_START)):
        with BuildLine():
            Line((-29.59569179817021, -4.544604097780221), (-29.595691798170208, 5.469178555653164))
            Line((-29.595691798170208, 5.469178555653164), (-20.51960657313938, 23.630126718567237))
            Line((-20.51960657313938, 23.630126718567237), (-11.384028520269917, 28.832788580533173))
            Line((-11.384028520269917, 28.832788580533173), (0.386433954908492, 13.99466572657217))
            ThreePointArc((0.386433954908492, 13.99466572657217), (-12.103611293588447, 7.035807960264281), (-11.969655932420048, -7.261359160617354))
            Line((-11.969655932420048, -7.261359160617354), (-29.59569179817021, -4.544604097780221))
        make_face()
    extrude(amount=WYTNIJ_WYCI_GNI_CIE4_DEPTH, mode=Mode.SUBTRACT)

    # Zaokrąglenie11
    zaokr_glenie11_edges = [part.edges().sort_by_distance(p)[0] for p in [
        (0.386433954908492, 13.99466572657217, 10.5),
        (-11.96965593242005, -7.261359160617353, 10.5),
        (-29.59569179817021, -4.544604097780221, 10.5),
        (-29.595691798170208, 5.469178555653164, 10.5),
        (-20.51960657313938, 23.630126718567237, 10.5),
        (-11.384028520269917, 28.832788580533173, 10.5),
    ]]
    fillet(zaokr_glenie11_edges, radius=ZAOKR_GLENIE11_R)


solid = part.part
